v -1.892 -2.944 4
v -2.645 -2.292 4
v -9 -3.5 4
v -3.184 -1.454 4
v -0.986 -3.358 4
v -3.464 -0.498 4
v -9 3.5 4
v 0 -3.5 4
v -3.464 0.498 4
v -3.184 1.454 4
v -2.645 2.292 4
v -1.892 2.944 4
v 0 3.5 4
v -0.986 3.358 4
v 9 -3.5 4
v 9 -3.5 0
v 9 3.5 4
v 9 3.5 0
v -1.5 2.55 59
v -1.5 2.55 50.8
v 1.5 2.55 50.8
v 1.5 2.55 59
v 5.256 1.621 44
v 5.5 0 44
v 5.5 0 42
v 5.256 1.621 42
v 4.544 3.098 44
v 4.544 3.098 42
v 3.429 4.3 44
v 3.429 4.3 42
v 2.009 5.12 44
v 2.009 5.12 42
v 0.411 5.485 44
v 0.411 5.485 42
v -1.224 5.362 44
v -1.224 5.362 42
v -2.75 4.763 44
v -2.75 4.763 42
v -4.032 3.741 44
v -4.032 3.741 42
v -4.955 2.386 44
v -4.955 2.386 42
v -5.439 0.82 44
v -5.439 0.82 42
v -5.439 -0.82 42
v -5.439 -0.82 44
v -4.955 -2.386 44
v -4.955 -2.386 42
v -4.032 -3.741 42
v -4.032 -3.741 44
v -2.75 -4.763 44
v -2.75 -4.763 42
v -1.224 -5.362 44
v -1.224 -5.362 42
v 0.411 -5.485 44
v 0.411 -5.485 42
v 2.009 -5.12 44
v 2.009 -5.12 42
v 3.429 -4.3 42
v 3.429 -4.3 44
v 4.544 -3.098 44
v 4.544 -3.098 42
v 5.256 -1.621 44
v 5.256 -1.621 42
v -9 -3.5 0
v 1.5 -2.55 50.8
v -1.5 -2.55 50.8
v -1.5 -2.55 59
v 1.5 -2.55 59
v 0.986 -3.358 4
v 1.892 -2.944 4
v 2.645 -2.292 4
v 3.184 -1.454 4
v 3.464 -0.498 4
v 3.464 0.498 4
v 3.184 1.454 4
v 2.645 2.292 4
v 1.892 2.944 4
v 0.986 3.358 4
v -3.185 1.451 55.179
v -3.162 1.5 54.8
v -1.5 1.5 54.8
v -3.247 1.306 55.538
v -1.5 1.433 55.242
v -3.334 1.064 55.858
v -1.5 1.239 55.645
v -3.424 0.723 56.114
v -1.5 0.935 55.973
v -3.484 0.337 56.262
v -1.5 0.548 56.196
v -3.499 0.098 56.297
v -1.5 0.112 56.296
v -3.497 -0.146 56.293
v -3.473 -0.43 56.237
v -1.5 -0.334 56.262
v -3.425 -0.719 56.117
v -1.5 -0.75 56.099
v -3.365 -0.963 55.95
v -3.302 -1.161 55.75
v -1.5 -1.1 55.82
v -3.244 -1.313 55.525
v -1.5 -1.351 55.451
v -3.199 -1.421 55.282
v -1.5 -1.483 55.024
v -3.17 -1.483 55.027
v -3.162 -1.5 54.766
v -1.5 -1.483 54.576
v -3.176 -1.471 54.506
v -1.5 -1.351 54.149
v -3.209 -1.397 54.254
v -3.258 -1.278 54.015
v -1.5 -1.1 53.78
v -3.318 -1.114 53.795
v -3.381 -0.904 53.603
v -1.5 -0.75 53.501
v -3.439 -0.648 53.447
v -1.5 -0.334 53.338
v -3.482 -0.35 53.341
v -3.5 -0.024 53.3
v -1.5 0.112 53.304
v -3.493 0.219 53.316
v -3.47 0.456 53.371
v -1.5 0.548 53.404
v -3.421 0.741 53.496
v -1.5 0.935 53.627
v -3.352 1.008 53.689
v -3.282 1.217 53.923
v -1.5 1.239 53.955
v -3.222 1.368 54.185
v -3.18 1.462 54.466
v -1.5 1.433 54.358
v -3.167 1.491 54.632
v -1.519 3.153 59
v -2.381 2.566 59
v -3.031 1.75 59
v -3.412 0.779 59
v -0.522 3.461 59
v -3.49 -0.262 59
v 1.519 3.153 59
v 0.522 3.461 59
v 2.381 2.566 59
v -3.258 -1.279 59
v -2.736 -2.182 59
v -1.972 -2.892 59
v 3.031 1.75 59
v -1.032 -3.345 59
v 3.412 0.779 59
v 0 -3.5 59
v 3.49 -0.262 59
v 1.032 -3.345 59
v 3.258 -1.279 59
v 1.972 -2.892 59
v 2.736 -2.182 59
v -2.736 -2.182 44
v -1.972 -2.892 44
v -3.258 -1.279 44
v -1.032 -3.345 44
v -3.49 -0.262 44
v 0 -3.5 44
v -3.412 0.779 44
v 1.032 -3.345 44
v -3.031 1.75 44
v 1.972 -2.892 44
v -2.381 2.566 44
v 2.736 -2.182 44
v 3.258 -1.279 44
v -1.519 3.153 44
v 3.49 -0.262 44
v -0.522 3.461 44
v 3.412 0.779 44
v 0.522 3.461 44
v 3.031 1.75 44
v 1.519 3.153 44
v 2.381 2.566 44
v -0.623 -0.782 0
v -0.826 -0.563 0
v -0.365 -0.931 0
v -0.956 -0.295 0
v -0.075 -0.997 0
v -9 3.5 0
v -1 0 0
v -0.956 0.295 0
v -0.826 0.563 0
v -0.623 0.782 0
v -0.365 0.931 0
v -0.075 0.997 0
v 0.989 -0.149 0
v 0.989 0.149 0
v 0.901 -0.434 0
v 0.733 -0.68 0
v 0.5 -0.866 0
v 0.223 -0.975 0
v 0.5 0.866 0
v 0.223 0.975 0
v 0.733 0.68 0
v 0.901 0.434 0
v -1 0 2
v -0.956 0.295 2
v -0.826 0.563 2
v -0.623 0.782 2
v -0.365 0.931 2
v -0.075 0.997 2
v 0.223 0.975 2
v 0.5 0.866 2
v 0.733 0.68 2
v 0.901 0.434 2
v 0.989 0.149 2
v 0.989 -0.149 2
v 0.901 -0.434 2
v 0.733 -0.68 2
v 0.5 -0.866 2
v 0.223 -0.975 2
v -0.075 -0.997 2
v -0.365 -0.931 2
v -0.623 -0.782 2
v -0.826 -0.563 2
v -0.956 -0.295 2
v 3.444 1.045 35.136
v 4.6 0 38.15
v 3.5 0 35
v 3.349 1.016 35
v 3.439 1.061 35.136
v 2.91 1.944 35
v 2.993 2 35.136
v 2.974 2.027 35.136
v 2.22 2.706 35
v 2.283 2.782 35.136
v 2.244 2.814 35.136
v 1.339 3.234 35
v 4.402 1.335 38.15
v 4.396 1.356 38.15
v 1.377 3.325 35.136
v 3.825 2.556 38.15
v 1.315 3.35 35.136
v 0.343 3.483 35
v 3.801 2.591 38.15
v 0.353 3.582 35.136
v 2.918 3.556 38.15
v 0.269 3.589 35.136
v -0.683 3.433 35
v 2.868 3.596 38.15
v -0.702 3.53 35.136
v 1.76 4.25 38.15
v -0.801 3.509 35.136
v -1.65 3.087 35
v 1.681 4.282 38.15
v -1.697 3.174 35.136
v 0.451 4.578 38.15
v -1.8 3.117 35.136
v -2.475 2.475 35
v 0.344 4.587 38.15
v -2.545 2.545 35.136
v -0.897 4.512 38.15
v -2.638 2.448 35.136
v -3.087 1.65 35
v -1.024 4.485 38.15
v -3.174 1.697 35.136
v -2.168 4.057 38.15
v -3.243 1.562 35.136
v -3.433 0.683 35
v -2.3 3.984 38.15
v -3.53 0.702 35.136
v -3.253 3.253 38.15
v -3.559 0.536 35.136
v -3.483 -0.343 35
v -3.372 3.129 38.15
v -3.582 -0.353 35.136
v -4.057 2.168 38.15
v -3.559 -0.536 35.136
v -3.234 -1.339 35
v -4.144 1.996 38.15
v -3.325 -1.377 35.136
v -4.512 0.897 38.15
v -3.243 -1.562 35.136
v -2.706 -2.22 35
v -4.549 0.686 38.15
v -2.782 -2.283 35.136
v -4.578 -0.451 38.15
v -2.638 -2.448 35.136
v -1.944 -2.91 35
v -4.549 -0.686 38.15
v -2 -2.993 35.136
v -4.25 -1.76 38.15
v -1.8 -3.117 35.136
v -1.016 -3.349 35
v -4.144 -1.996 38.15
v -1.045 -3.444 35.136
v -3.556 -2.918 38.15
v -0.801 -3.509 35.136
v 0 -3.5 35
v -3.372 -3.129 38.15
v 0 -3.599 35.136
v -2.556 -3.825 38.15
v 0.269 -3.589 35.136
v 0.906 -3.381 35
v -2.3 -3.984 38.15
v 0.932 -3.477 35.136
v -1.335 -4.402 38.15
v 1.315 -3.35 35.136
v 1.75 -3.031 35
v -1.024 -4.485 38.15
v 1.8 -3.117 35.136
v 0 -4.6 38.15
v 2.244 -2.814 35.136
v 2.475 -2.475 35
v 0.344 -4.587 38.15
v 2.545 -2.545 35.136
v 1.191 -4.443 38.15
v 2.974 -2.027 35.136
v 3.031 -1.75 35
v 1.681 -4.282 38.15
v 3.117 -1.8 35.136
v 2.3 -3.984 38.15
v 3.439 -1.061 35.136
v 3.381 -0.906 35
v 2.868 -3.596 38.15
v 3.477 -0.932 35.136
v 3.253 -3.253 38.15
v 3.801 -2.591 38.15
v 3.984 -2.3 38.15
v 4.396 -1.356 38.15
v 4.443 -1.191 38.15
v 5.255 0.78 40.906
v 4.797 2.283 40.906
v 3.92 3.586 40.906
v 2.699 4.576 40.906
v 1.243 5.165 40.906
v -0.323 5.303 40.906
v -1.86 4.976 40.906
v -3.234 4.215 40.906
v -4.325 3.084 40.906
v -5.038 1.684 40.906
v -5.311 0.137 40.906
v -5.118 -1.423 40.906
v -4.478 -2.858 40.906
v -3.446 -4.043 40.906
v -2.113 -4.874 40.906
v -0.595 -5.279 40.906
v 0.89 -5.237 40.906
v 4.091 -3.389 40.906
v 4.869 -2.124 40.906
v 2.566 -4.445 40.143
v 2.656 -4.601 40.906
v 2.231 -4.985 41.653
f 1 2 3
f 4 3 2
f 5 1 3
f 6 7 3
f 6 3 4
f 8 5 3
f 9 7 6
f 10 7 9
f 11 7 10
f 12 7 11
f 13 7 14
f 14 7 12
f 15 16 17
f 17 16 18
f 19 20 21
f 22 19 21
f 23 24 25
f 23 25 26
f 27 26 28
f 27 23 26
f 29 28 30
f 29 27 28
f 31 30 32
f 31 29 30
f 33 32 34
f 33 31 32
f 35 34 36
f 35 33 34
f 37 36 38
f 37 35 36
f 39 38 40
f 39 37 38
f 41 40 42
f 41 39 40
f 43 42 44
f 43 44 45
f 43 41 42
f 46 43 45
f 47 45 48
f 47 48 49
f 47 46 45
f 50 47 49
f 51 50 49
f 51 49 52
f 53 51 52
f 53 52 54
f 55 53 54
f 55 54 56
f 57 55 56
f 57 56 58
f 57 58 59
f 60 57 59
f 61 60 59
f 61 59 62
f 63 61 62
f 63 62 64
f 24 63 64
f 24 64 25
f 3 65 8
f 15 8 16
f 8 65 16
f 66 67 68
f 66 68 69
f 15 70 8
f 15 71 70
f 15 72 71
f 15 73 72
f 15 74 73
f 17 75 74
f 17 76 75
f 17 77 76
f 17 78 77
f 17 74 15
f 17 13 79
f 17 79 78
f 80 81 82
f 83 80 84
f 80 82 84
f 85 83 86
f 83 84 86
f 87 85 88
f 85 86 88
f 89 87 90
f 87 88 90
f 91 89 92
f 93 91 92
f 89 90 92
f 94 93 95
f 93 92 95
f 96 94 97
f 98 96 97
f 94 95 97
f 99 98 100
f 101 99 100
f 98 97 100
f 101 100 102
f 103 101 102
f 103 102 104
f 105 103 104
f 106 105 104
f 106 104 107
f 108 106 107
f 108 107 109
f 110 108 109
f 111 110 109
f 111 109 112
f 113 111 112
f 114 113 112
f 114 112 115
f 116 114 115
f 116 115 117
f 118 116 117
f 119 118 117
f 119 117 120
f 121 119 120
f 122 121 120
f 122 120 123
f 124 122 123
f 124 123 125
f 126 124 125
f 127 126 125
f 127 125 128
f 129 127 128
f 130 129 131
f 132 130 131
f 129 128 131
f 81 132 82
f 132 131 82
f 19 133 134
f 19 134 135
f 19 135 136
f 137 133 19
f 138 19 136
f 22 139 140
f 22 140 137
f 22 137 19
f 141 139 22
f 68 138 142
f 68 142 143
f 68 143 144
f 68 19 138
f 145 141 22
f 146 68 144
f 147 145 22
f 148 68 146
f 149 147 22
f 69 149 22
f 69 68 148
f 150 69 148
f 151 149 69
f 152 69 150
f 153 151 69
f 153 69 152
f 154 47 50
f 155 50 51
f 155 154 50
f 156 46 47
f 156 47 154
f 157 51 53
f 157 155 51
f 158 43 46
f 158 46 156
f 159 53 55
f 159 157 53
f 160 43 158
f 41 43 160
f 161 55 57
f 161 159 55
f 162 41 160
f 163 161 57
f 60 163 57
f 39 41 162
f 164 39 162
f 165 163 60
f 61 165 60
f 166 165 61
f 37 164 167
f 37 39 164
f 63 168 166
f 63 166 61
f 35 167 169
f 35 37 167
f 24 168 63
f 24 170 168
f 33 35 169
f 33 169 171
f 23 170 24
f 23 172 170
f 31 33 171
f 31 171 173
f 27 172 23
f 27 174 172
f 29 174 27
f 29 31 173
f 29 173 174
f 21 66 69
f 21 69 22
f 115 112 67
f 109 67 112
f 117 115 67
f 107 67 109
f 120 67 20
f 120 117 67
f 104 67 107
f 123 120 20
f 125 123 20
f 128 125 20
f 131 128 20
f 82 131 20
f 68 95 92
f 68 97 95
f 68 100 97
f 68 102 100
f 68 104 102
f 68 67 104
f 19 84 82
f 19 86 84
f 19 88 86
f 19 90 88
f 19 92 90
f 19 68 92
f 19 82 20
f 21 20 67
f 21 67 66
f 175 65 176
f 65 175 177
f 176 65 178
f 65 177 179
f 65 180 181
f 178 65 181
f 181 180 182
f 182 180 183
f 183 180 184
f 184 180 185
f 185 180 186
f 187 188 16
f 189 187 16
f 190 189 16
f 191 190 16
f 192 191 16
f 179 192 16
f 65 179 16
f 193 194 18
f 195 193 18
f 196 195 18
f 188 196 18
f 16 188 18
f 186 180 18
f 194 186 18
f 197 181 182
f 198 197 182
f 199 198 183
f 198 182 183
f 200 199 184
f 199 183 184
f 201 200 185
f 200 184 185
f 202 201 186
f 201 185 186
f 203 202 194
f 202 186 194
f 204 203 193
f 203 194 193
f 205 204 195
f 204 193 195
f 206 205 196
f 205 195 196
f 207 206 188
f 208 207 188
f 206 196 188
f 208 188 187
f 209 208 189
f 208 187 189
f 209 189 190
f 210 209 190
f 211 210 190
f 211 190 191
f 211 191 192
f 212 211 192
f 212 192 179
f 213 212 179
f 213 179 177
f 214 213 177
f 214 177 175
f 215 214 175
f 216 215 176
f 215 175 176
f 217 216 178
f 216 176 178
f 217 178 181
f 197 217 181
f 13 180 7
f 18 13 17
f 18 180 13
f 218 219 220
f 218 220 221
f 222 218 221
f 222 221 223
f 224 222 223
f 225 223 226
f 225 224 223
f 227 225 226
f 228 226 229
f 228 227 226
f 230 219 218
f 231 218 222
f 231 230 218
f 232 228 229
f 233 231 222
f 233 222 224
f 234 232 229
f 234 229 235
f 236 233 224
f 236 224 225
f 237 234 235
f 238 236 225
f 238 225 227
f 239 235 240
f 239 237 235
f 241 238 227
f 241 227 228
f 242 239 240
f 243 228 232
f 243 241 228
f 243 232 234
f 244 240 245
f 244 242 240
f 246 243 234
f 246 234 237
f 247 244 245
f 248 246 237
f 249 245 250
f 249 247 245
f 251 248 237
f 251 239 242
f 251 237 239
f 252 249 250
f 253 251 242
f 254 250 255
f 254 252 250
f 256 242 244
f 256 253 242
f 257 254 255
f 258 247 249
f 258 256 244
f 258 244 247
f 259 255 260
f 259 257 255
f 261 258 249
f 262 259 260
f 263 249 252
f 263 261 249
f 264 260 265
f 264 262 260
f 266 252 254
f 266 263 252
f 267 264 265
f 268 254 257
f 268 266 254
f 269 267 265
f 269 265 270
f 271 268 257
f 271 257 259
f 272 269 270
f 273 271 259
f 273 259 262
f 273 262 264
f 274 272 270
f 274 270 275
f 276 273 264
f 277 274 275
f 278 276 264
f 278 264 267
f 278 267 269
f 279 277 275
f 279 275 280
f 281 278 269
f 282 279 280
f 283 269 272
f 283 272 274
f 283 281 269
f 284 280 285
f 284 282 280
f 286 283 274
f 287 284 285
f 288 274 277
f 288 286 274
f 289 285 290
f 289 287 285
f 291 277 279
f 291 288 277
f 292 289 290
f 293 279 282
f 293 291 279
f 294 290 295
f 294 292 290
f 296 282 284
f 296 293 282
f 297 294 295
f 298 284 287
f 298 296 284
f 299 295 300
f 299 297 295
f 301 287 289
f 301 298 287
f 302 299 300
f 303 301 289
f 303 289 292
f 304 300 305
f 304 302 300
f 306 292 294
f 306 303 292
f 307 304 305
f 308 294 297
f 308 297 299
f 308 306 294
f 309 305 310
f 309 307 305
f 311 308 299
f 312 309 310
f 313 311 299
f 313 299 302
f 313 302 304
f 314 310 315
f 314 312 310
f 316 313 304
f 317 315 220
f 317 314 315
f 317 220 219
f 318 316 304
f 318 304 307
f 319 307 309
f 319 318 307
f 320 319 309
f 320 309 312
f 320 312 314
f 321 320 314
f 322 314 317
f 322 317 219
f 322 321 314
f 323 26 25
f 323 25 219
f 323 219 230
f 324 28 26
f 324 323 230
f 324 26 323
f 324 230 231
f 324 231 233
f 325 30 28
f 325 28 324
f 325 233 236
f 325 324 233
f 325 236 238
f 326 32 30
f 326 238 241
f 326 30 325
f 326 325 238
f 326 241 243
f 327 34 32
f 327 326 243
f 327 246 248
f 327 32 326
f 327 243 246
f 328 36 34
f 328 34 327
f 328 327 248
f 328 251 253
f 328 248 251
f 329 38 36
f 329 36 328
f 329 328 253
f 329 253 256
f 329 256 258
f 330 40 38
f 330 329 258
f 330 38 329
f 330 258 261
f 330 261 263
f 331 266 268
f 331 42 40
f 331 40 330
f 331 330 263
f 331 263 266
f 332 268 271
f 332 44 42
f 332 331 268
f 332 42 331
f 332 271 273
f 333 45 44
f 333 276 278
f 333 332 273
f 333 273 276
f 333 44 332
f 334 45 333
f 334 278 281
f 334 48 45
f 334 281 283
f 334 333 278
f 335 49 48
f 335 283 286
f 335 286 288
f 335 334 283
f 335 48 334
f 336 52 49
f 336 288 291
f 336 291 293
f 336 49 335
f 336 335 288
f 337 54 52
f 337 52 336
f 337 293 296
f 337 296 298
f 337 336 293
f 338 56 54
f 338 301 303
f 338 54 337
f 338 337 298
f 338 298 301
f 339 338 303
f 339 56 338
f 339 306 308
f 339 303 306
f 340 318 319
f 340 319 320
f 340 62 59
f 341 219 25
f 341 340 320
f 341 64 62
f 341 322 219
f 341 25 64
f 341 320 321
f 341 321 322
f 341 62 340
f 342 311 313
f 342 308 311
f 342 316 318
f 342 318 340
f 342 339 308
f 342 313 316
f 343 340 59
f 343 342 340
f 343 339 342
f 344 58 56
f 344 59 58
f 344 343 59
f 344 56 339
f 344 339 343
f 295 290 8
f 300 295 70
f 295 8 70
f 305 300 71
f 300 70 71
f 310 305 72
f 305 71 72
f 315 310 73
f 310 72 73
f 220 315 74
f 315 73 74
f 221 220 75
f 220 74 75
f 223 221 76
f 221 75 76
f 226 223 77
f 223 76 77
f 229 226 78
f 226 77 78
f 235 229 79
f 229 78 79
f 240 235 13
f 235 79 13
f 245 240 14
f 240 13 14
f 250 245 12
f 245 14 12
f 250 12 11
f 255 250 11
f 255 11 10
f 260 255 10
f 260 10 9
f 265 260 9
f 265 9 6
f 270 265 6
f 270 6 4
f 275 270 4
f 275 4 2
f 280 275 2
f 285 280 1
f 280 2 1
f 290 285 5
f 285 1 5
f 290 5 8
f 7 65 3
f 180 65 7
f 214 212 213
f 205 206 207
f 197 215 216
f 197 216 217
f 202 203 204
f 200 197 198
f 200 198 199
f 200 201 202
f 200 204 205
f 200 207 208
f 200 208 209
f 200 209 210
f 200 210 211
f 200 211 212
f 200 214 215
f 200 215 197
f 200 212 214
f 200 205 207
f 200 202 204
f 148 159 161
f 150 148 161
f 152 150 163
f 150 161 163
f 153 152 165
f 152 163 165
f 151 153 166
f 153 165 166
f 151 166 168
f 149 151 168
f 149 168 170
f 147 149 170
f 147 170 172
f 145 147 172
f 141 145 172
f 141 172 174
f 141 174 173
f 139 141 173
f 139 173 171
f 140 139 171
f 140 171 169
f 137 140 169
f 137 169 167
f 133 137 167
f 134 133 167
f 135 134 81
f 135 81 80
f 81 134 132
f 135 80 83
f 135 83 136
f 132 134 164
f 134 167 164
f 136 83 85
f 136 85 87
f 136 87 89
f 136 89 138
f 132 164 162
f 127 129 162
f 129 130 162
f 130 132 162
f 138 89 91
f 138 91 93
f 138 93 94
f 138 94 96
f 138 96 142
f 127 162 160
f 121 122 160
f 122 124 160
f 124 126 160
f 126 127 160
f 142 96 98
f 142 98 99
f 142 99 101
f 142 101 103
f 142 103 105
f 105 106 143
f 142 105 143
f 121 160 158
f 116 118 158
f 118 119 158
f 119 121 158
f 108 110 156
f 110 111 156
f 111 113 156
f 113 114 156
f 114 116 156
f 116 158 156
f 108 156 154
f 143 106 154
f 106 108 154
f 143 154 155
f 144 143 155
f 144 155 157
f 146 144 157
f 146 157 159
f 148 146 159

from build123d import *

# Parameters (mm, degrees)
SCHIZZO2_W                    = 18
SCHIZZO2_H                    = 7
ESTRUSIONE_ESTRUSIONE1_DEPTH  = 4
SCHIZZO3_R                    = 3.5
ESTRUSIONE_ESTRUSIONE2_DEPTH  = 55
SCHIZZO4_W                    = 3
SCHIZZO4_H                    = 5.1
TAGLIO_ESTRUSIONE1_DEPTH      = 8.2
TAGLIO_ESTRUSIONE2_REACH      = 62.029
TAGLIO_ESTRUSIONE2_END_RADIUS = 3.5
SCHIZZO5_R                    = 1.5
SCHIZZO6_R                    = 5.5
ESTRUSIONE_ESTRUSIONE3_DEPTH  = 9
RACCORDO1_SIZE                = 2
RACCORDO1_SIZE_2              = 7
SCHIZZO7_R                    = 1
TAGLIO_ESTRUSIONE3_DEPTH      = 2


with BuildPart() as part:
    # Schizzo2 → Estrusione-Estrusione1 (new body)
    with BuildSketch(Plane.XY):
        Rectangle(SCHIZZO2_W, SCHIZZO2_H)
    extrude(amount=ESTRUSIONE_ESTRUSIONE1_DEPTH)

    # Schizzo3 → Estrusione-Estrusione2 (add)
    with BuildSketch(Plane.XY.offset(4)):
        with Locations(Location((0, 0, 0), (0, 0, 270))):
            Circle(SCHIZZO3_R)
    extrude(amount=ESTRUSIONE_ESTRUSIONE2_DEPTH)

    # Schizzo4 → Taglio-Estrusione1 (cut)
    with BuildSketch(Plane.XY.offset(59)):
        Rectangle(SCHIZZO4_W, SCHIZZO4_H)
    extrude(amount=-TAGLIO_ESTRUSIONE1_DEPTH, mode=Mode.SUBTRACT)

    # Taglio-Estrusione2: up to this cylinder (the profile starts inside it)
    taglio_estrusione2_end = Plane(origin=(0, 0, 54.8), z_dir=(0, 0, -1)) * Cylinder(TAGLIO_ESTRUSIONE2_END_RADIUS, 132.058, mode=Mode.PRIVATE)
    # Schizzo5 → Taglio-Estrusione2 (cut, up to the surface)
    with BuildSketch(Plane(origin=(-1.5, 0, 0), x_dir=(0, 0, -1), z_dir=(1, 0, 0)), mode=Mode.PRIVATE) as taglio_estrusione2_sk1:
        with Locations(Location((-54.8, 0, 0), (0, 0, 90))):
            Circle(SCHIZZO5_R)
    taglio_estrusione2_tool1 = extrude(taglio_estrusione2_sk1.sketch, amount=-TAGLIO_ESTRUSIONE2_REACH, mode=Mode.PRIVATE) & taglio_estrusione2_end
    add(taglio_estrusione2_tool1.solids().sort_by_distance((-1.5, 0, 54.8))[0], mode=Mode.SUBTRACT)

    # Schizzo6 → Estrusione-Estrusione3 (add)
    with BuildSketch(Plane.XY.offset(44)):
        Circle(SCHIZZO6_R)
    extrude(amount=-ESTRUSIONE_ESTRUSIONE3_DEPTH)

    # Raccordo1
    # a fillet whose section is not a circle: 7, 2 mm, written as the material it takes off along each edge
    with BuildSketch(Plane(origin=(0, 0, 35), x_dir=(1, 0, 0), z_dir=(0, -1, 0))) as raccordo1_piece_1_section:
        with BuildLine():
            Bezier((5.5 - RACCORDO1_SIZE, 0), (5.5, 0), (5.5, RACCORDO1_SIZE_2), weights=[1, 0.111111111, 1])
            Line((5.5, RACCORDO1_SIZE_2), (5.5, 0))
            Line((5.5, 0), (5.5 - RACCORDO1_SIZE, 0))
        make_face()
    raccordo1_piece_1 = revolve(axis=Axis((0, 0, 35), (0, 0, 1)), mode=Mode.PRIVATE)
    raccordo1_piece_1 = raccordo1_piece_1 - Plane(origin=(0, 0, 35), x_dir=(0, -1, 0), z_dir=(0, 0, -1)) * Cylinder(3.5, 28, mode=Mode.PRIVATE)
    add(raccordo1_piece_1, mode=Mode.SUBTRACT)

    # Schizzo7 → Taglio-Estrusione3 (cut)
    with BuildSketch(Plane(origin=(0, 0, 0), x_dir=(-1, 0, 0), z_dir=(0, 0, -1))):
        Circle(SCHIZZO7_R)
    extrude(amount=-TAGLIO_ESTRUSIONE3_DEPTH, mode=Mode.SUBTRACT)


solid = part.part
